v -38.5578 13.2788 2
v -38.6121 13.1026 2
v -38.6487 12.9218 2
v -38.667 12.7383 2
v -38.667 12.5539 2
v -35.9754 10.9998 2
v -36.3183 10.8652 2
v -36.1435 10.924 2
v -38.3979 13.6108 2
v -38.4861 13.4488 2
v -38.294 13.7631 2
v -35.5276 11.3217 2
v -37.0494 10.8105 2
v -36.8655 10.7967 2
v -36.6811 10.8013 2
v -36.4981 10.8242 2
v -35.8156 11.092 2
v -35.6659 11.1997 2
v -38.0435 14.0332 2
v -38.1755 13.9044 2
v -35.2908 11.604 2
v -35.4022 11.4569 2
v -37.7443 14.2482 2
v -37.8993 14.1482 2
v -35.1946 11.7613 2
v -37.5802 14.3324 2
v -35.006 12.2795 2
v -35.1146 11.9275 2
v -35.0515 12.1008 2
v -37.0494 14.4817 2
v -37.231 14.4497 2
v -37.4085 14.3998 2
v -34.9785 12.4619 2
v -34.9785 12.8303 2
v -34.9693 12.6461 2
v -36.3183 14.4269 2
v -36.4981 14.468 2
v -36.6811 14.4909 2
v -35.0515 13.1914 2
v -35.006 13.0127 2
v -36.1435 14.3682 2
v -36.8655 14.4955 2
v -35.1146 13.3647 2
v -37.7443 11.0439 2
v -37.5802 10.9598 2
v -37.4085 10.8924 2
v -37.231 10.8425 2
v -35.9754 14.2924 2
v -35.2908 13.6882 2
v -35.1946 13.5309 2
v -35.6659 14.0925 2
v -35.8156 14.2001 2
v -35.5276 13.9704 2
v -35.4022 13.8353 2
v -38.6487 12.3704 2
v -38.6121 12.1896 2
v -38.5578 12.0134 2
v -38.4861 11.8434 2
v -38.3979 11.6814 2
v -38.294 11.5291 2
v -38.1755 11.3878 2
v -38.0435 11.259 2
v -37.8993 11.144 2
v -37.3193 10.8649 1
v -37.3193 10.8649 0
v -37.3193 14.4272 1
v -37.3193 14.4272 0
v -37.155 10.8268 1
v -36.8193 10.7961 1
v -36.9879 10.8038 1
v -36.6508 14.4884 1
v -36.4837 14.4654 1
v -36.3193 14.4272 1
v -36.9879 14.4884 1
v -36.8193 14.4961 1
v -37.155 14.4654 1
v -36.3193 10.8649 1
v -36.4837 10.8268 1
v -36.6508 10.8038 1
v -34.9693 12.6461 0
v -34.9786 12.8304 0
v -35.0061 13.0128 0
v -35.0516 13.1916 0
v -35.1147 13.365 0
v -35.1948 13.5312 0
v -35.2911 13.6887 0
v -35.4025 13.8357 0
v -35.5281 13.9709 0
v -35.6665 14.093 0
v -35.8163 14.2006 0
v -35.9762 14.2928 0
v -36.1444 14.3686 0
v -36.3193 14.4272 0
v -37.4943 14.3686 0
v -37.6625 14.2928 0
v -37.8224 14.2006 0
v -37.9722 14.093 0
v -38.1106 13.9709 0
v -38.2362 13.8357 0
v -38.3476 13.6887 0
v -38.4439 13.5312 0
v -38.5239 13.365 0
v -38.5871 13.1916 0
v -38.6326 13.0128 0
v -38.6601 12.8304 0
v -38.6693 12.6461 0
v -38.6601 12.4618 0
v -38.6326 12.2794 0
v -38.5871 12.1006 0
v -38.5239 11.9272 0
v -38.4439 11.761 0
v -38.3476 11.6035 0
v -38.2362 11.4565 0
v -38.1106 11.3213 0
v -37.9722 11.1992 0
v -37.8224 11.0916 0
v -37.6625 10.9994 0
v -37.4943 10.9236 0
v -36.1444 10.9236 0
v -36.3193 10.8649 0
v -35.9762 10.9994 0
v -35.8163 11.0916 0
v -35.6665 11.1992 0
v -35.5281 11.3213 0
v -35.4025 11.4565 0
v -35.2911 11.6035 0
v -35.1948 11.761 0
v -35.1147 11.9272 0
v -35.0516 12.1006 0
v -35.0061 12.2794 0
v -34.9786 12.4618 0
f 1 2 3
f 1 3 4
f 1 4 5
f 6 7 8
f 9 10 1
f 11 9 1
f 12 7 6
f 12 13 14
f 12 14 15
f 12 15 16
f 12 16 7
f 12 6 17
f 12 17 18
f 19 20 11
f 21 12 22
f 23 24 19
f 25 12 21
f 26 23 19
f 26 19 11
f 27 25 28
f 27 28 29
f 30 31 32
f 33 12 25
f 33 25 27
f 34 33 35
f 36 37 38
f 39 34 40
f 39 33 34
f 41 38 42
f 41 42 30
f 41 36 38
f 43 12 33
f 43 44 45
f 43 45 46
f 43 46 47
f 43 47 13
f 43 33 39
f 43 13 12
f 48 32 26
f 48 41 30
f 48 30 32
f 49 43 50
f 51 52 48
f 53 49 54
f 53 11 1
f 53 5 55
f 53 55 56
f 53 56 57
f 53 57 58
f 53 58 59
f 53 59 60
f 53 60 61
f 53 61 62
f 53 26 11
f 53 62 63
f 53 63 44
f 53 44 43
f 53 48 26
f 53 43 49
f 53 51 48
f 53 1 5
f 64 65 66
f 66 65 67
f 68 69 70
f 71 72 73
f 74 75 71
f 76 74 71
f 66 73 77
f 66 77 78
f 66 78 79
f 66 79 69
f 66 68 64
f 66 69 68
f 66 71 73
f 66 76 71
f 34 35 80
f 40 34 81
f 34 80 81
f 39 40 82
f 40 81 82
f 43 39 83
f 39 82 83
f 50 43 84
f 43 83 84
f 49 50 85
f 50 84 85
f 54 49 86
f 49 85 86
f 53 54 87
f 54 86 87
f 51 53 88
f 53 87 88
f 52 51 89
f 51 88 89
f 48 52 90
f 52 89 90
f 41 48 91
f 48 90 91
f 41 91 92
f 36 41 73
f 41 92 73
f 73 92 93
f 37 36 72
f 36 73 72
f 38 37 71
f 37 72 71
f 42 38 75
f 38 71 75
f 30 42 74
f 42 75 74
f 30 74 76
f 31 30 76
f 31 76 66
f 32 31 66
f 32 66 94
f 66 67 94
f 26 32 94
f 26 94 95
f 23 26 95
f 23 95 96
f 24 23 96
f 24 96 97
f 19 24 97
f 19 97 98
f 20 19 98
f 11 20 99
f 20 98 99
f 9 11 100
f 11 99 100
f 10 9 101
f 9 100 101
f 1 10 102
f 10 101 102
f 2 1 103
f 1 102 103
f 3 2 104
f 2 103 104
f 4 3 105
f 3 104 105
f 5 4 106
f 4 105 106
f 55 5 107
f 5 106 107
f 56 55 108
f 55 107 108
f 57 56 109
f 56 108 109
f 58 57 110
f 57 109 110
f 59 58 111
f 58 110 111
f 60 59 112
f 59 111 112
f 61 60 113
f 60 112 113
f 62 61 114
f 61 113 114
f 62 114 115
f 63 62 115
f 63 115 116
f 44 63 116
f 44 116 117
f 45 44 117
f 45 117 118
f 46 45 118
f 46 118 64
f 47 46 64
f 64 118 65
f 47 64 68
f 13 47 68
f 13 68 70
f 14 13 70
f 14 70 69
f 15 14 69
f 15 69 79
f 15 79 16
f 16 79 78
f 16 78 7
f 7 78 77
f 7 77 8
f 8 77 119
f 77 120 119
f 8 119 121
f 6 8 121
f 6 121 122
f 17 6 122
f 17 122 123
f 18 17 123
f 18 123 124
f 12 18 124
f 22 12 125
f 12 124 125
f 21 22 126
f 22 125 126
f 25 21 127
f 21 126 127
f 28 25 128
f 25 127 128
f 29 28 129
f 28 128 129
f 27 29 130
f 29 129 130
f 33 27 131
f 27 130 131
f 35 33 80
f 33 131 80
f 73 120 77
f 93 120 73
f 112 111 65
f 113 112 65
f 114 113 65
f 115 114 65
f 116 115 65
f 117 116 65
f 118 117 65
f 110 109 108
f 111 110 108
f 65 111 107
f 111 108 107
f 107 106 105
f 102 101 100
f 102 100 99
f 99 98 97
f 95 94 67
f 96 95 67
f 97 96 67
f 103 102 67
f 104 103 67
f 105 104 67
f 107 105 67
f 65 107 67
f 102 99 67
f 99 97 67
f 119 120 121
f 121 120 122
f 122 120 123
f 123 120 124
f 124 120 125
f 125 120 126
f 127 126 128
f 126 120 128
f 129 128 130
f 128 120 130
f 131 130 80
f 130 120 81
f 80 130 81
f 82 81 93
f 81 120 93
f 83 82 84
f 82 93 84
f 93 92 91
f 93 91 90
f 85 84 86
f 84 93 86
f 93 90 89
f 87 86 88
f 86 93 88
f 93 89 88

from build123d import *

# Parameters (mm, degrees)
ESBO_O1_R                = 1.85
RESSALTO_EXTRUS_O1_DEPTH = 2
ESBO_O2_W                = 1
ESBO_O2_H                = 5.130124138
CORTE_EXTRUS_O1_DEPTH    = 1


with BuildPart() as part:
    # Esboço1 → Ressalto-extrusão1 (new body)
    with BuildSketch(Plane.XY):
        with Locations((-36.819348603, 12.646095076)):
            Circle(ESBO_O1_R)
    extrude(amount=RESSALTO_EXTRUS_O1_DEPTH)

    # Esboço2 → Corte-extrusão1 (cut)
    with BuildSketch(Plane(origin=(0, 0, 0), x_dir=(-1, 0, 0), z_dir=(0, 0, -1))):
        with Locations((36.819348603, 12.69871976)):
            Rectangle(ESBO_O2_W, ESBO_O2_H)
    extrude(amount=-CORTE_EXTRUS_O1_DEPTH, mode=Mode.SUBTRACT)


solid = part.part
